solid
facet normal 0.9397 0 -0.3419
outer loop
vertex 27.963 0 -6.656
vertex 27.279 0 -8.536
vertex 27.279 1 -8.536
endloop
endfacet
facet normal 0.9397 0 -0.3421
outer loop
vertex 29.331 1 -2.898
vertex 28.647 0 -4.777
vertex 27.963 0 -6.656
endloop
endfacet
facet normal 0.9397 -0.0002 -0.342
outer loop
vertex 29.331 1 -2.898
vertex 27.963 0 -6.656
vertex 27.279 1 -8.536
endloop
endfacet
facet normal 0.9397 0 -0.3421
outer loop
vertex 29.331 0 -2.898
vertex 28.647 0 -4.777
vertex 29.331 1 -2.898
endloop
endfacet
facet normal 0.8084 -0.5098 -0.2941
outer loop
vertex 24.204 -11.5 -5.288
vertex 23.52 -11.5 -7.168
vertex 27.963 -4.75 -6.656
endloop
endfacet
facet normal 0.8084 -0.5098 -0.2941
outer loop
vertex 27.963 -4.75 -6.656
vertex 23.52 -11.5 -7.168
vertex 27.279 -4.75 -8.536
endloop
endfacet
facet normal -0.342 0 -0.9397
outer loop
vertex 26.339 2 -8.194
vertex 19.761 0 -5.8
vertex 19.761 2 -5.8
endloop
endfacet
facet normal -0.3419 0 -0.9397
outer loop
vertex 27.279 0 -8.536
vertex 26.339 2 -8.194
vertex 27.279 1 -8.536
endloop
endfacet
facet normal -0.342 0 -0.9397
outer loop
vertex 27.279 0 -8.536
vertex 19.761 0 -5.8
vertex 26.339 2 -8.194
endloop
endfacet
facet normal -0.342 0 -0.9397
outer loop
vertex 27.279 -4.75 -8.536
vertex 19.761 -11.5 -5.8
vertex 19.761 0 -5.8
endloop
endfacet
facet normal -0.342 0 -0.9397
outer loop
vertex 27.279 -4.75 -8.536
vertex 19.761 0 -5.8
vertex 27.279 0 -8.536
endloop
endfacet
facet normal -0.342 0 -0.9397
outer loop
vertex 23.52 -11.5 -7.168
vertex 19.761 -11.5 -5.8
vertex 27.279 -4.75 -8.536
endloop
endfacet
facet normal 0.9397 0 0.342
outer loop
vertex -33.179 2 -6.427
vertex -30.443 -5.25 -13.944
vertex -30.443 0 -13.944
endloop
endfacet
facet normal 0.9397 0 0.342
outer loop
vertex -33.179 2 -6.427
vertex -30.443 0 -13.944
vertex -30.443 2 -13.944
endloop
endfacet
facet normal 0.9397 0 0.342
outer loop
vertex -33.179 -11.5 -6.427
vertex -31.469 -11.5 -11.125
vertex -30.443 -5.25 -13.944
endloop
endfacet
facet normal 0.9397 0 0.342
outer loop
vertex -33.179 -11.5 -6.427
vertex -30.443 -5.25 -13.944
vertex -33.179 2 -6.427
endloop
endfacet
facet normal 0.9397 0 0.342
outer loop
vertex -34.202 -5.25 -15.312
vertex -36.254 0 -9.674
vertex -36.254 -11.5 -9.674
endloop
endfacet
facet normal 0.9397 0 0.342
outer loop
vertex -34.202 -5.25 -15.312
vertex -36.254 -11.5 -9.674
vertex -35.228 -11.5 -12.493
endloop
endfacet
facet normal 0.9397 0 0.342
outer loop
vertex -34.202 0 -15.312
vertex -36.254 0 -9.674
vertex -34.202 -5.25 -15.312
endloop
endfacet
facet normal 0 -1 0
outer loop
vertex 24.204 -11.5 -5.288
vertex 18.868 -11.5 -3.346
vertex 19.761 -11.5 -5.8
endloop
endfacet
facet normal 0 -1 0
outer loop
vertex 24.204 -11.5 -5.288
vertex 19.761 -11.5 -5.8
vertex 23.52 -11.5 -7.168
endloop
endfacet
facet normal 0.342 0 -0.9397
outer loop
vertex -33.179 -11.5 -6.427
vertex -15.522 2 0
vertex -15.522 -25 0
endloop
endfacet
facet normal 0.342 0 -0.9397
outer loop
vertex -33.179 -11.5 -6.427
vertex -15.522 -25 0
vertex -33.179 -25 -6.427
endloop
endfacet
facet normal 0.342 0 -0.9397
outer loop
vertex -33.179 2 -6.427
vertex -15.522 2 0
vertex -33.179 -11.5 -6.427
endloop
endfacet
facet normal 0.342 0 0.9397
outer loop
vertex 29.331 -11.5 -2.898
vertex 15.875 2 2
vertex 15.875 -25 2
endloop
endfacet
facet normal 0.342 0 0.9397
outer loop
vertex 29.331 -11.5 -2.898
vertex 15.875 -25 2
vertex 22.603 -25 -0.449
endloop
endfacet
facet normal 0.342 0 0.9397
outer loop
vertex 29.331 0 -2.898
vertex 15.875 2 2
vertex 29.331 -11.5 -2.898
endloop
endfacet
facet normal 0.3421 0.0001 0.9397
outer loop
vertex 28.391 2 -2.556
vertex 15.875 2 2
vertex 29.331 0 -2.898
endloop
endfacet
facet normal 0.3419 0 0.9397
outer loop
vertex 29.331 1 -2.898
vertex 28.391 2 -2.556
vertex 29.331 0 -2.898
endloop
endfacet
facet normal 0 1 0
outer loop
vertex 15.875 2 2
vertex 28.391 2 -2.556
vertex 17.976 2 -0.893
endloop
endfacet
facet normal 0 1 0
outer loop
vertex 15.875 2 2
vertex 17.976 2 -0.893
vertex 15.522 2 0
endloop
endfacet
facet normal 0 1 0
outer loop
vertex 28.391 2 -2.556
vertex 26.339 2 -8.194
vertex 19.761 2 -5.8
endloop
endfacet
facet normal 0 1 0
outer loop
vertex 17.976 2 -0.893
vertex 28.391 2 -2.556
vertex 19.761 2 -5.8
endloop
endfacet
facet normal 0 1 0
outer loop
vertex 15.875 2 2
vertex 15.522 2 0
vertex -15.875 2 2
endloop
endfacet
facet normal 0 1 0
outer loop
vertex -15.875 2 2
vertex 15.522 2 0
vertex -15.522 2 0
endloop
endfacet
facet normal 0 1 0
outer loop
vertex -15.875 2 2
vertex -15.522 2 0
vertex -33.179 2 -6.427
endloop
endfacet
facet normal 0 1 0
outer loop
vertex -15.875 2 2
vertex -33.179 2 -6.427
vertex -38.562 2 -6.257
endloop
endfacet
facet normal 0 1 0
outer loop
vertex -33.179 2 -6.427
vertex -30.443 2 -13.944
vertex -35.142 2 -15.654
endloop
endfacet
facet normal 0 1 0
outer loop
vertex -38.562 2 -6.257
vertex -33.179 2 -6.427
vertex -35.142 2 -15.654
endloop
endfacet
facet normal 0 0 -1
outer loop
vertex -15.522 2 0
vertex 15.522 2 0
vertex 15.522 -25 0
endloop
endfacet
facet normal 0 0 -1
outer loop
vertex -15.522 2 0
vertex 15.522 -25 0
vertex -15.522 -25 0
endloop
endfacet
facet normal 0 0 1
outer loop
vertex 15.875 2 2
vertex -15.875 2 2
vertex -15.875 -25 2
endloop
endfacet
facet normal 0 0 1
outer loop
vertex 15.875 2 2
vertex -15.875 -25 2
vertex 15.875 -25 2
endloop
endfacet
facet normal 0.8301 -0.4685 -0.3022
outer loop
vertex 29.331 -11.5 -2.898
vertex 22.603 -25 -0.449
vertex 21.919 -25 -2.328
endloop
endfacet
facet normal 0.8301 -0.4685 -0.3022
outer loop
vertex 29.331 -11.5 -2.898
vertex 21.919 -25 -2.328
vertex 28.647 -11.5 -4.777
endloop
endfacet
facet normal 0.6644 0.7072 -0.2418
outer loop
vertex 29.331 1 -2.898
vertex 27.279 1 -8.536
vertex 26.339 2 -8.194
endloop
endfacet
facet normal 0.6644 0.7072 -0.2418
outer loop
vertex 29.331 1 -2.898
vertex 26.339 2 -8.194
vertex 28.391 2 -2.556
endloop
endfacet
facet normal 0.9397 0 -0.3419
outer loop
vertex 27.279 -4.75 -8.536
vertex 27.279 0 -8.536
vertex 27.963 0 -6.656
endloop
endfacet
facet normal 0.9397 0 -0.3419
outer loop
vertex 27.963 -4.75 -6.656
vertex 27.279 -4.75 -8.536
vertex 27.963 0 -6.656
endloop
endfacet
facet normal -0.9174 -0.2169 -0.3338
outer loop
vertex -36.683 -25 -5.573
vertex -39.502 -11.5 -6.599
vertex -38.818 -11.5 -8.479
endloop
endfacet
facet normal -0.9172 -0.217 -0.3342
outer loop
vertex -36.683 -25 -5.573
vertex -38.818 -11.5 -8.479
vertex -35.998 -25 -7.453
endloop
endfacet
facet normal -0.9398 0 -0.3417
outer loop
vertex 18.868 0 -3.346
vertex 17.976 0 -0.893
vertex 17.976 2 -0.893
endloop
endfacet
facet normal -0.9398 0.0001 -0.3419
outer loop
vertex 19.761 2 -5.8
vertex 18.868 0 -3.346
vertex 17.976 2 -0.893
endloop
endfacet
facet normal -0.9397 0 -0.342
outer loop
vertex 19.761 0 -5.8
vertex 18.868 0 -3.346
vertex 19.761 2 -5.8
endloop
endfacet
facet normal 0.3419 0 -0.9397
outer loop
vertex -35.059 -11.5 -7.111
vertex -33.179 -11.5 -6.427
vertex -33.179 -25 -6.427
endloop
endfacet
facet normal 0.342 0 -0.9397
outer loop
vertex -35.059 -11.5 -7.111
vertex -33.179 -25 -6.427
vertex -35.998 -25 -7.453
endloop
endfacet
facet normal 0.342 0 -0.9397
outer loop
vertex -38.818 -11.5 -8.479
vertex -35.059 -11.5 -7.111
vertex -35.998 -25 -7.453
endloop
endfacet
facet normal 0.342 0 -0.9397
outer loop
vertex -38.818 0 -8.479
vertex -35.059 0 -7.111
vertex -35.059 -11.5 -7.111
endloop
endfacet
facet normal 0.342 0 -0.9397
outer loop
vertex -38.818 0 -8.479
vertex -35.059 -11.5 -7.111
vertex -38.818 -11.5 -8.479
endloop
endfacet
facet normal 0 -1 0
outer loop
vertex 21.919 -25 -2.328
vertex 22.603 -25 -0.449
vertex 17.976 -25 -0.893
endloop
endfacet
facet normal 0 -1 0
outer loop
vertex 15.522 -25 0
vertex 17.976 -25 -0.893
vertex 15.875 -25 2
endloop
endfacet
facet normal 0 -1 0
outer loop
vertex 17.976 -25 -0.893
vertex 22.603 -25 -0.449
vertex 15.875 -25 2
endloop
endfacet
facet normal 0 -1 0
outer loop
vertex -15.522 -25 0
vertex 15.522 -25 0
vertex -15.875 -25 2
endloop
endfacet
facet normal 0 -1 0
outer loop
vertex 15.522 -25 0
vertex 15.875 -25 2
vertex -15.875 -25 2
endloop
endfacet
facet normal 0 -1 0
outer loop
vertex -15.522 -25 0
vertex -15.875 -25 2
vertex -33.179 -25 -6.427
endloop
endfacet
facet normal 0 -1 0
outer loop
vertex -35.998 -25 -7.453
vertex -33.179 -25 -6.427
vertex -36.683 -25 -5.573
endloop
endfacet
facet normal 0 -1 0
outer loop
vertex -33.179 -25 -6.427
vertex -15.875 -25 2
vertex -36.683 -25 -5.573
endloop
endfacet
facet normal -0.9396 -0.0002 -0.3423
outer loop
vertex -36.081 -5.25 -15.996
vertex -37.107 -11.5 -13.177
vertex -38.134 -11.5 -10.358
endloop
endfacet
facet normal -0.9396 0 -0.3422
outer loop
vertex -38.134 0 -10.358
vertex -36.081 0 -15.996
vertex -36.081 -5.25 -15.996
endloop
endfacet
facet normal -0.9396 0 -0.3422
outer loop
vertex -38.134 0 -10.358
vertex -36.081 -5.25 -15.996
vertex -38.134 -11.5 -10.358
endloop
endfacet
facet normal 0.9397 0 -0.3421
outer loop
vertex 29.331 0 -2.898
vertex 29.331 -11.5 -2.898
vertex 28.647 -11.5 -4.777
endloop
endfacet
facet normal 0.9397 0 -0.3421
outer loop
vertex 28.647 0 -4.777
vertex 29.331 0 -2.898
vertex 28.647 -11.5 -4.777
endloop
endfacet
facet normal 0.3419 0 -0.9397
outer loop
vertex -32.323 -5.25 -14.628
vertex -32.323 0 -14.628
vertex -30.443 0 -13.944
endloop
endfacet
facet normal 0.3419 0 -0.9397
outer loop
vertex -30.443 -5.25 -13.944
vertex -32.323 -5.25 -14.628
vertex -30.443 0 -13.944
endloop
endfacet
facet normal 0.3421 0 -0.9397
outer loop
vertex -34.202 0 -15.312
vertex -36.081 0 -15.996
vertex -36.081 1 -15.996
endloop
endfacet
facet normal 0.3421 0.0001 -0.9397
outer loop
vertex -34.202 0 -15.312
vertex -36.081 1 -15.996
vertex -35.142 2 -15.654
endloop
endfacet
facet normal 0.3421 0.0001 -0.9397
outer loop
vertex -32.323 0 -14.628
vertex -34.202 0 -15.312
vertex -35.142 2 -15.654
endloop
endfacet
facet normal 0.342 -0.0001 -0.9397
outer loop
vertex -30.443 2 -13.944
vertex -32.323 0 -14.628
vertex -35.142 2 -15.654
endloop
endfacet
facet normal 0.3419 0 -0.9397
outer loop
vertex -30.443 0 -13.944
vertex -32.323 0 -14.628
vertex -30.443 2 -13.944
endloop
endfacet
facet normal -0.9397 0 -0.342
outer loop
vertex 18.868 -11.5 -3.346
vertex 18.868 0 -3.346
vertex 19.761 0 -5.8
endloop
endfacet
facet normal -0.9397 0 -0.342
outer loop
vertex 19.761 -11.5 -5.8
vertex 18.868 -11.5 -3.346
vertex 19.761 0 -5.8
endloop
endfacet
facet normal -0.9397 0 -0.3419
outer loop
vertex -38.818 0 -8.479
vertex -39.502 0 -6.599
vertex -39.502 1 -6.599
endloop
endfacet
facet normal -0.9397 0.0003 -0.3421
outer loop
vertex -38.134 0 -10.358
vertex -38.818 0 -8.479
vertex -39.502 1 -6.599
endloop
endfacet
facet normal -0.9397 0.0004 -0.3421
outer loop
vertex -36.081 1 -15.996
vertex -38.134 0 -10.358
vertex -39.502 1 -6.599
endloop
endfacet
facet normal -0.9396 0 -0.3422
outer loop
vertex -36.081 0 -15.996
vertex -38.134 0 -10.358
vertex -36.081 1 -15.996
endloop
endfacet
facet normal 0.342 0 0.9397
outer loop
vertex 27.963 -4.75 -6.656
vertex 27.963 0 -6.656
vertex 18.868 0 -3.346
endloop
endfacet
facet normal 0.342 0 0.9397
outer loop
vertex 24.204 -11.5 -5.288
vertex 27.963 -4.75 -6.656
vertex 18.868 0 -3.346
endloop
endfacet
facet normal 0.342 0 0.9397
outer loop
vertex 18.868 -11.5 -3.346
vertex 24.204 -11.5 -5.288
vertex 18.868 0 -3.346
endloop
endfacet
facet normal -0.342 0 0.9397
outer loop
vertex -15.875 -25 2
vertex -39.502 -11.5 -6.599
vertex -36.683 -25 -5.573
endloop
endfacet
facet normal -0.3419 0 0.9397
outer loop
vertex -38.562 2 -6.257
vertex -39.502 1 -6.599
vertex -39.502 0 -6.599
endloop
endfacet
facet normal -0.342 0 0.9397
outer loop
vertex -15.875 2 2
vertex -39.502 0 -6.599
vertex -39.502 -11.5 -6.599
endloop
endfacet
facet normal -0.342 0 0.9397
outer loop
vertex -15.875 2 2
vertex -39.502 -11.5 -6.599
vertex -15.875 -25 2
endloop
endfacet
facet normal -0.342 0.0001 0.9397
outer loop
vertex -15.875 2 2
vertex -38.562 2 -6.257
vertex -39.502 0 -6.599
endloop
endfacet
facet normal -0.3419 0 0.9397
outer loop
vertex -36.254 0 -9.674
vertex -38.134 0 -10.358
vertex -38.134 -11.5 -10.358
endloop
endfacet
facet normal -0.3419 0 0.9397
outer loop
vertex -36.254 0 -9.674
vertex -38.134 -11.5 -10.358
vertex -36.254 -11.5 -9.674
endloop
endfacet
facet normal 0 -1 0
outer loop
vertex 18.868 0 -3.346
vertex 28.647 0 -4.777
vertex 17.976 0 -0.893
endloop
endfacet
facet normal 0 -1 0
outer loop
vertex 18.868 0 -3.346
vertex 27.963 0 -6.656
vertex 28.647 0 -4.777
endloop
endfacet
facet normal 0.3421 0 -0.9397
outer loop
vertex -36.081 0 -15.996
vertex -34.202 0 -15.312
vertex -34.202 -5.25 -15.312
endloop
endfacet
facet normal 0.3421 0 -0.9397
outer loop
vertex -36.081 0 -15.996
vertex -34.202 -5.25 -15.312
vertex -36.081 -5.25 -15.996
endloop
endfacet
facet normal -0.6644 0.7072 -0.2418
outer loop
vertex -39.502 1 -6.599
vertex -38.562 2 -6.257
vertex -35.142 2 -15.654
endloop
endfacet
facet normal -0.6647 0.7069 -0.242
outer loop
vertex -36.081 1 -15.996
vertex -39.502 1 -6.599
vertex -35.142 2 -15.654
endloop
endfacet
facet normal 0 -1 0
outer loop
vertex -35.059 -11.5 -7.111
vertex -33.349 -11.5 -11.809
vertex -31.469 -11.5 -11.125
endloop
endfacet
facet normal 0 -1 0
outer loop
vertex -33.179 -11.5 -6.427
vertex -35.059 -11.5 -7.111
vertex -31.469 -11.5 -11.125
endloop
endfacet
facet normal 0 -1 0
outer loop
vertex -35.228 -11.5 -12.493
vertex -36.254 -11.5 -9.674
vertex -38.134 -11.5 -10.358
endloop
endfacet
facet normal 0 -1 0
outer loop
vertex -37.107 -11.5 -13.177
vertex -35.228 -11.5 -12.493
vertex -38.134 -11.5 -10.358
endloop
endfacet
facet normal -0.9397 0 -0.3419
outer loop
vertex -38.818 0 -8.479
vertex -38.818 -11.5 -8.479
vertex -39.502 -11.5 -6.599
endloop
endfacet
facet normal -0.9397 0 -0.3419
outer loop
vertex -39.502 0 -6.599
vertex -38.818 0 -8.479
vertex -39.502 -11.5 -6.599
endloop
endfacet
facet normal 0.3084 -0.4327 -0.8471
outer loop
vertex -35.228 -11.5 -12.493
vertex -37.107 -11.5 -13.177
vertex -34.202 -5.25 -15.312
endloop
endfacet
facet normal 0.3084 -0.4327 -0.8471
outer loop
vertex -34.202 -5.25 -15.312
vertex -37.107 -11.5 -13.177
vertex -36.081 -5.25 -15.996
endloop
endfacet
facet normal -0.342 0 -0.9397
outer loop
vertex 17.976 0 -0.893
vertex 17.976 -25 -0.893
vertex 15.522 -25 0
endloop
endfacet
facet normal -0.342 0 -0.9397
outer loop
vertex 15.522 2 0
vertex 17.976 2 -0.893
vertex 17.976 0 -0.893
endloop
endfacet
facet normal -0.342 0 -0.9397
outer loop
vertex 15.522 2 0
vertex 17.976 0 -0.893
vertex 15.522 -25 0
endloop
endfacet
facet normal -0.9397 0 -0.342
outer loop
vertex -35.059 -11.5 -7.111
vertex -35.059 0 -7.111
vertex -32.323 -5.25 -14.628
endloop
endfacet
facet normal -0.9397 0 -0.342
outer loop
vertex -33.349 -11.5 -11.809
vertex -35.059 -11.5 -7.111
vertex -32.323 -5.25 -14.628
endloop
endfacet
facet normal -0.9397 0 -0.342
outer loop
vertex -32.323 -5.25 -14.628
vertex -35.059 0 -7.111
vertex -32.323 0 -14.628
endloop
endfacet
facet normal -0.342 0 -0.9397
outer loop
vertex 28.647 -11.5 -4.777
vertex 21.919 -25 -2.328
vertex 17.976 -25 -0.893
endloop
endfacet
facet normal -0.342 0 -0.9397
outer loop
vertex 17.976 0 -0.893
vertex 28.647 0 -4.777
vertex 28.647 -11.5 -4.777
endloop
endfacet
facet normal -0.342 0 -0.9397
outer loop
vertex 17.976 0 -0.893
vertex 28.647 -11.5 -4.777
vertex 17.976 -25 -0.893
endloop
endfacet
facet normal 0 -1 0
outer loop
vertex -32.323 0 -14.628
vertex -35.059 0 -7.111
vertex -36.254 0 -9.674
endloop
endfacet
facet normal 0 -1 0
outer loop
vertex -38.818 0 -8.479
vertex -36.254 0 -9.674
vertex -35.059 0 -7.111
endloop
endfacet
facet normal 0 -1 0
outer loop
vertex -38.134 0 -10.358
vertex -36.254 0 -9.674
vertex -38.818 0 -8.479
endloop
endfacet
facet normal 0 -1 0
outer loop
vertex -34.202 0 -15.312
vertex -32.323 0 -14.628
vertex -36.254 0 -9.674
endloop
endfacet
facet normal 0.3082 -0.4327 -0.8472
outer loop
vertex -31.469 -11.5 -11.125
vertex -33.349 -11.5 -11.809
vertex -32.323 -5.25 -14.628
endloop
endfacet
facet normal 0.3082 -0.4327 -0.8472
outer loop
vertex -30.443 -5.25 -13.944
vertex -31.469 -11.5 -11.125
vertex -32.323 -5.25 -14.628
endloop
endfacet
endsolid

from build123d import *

# Parameters (mm, degrees)
BOSS_EXTRUDE4_DEPTH = 2
BOSS_EXTRUDE7_DEPTH = 25
BOSS_EXTRUDE8_DEPTH = 11.5
CUT_EXTRUDE4_DEPTH  = 2
CUT_EXTRUDE5_DEPTH  = 2
CUT_EXTRUDE6_DEPTH  = 2
CHAMFER2_SIZE       = 1
CUT_EXTRUDE8_REACH  = 74.555


with BuildPart() as part:
    # Sketch8 → Boss-Extrude4 (new body)
    with BuildSketch(Plane(origin=(0, 0, 0), x_dir=(1, 0, 0), z_dir=(0, 1, 0))):
        Polygon((19.761418396, 5.799677564), (27.278959362, 8.535838711), (29.331080222, 2.897682986), (15.874806811, -2), (-15.874806811, -2), (-39.501605359, 6.599451403), (-36.081403926, 15.996377611), (-30.443248201, 13.944256751), (-33.179409348, 6.426715784), (-15.522152849, 0), (15.522152849, 0), (17.975516043, 0.892951176), align=None)
    extrude(amount=BOSS_EXTRUDE4_DEPTH)

    # Sketch12 → Boss-Extrude7 (add)
    with BuildSketch(Plane.XZ):
        Polygon((-39.501605359, -6.599451403), (-15.874806811, 2), (15.874806811, 2), (29.331080222, -2.897682986), (28.647039935, -4.777068227), (17.975516043, -0.892951176), (15.522152849, 0), (-15.522152849, 0), (-33.179409348, -6.426715784), (-38.817565073, -8.478836644), align=None)
    extrude(amount=BOSS_EXTRUDE7_DEPTH)

    # Sketch13 → Boss-Extrude8 (add)
    with BuildSketch(Plane.XZ):
        Polygon((-34.202018685, -15.312337324), (-36.081403926, -15.996377611), (-38.133524786, -10.358221886), (-36.254139544, -9.674181599), align=None)
        Polygon((-32.322633443, -14.628297037), (-30.443248201, -13.944256751), (-33.179409348, -6.426715784), (-35.05879459, -7.110756071), align=None)
        Polygon((19.761418396, -5.799677564), (27.278959362, -8.535838711), (27.962999649, -6.656453469), (18.868467219, -3.34631437), align=None)
    extrude(amount=BOSS_EXTRUDE8_DEPTH)

    # Sketch15 → Cut-Extrude4 (cut)
    with BuildSketch(Plane(origin=(0.447666384, 0, 1.22995328), x_dir=(-0.9396926207859031, 0, 0.34202014332568326), z_dir=(-0.34202014332568326, 0, -0.9396926207859031))):
        Polygon((-24.553265595, -11.5), (-28.553265595, -4.75), (-28.553265595, -11.5), align=None)
    extrude(amount=-CUT_EXTRUDE4_DEPTH, mode=Mode.SUBTRACT)

    # Sketch16 → Cut-Extrude5 (cut)
    with BuildSketch(Plane(origin=(2.499787244, 0, 6.868109005), x_dir=(0.9396926207859029, 0, -0.3420201433256841), z_dir=(0.34202014332568403, 0, 0.9396926207859028))):
        Polygon((21.393332062, -25), (28.553265595, -11.5), (28.553265595, -25), align=None)
    extrude(amount=-CUT_EXTRUDE5_DEPTH, mode=Mode.SUBTRACT)

    # Sketch17 → Cut-Extrude6 (cut)
    with BuildSketch(Plane(origin=(-2.499787244, 0, 6.868109005), x_dir=(0.9396926207859133, 0, 0.3420201433256553), z_dir=(-0.3420201433256553, 0, 0.9396926207859133))):
        Polygon((-39.37651238, -25), (-39.37651238, -11.5), (-36.37651238, -25), align=None)
    extrude(amount=-CUT_EXTRUDE6_DEPTH, mode=Mode.SUBTRACT)

    # Chamfer2
    chamfer2_edges = [part.edges().sort_by_distance(p)[0] for p in [
        (-37.791504643, 2, -11.297914507),
        (28.305019792, 2, -5.716760848),
    ]]
    chamfer(chamfer2_edges, length=CHAMFER2_SIZE)

    # Cut-Extrude8: up to this face of the body (flat: up to its plane)
    cut_extrude8_end = Plane(part.part.faces().sort_by_distance((-31.811328775, -4.75, -10.185486267))[0])
    # Sketch23 → Cut-Extrude8 (cut, up to the picked face)
    with BuildSketch(Plane(origin=(-37.001818116, 0, -13.467560408), x_dir=(-0.3420201433256551, 0, 0.9396926207859133), z_dir=(-0.9396926207859133, 0, -0.3420201433256551)), mode=Mode.PRIVATE) as cut_extrude8_sk1:
        Polygon((0.308888942, -11.5), (-2.691111058, -5.25), (-2.691111058, -11.5), align=None)
    cut_extrude8_tool1 = split(extrude(cut_extrude8_sk1.sketch, amount=-CUT_EXTRUDE8_REACH, mode=Mode.PRIVATE), bisect_by=cut_extrude8_end, keep=Keep.BOTH, mode=Mode.PRIVATE)
    add(cut_extrude8_tool1.solids().sort_by(Axis((-36.423424, -9.416667, -15.056685), (0.9396926207859133, 0, 0.3420201433256551)))[0], mode=Mode.SUBTRACT)


solid = part.part
